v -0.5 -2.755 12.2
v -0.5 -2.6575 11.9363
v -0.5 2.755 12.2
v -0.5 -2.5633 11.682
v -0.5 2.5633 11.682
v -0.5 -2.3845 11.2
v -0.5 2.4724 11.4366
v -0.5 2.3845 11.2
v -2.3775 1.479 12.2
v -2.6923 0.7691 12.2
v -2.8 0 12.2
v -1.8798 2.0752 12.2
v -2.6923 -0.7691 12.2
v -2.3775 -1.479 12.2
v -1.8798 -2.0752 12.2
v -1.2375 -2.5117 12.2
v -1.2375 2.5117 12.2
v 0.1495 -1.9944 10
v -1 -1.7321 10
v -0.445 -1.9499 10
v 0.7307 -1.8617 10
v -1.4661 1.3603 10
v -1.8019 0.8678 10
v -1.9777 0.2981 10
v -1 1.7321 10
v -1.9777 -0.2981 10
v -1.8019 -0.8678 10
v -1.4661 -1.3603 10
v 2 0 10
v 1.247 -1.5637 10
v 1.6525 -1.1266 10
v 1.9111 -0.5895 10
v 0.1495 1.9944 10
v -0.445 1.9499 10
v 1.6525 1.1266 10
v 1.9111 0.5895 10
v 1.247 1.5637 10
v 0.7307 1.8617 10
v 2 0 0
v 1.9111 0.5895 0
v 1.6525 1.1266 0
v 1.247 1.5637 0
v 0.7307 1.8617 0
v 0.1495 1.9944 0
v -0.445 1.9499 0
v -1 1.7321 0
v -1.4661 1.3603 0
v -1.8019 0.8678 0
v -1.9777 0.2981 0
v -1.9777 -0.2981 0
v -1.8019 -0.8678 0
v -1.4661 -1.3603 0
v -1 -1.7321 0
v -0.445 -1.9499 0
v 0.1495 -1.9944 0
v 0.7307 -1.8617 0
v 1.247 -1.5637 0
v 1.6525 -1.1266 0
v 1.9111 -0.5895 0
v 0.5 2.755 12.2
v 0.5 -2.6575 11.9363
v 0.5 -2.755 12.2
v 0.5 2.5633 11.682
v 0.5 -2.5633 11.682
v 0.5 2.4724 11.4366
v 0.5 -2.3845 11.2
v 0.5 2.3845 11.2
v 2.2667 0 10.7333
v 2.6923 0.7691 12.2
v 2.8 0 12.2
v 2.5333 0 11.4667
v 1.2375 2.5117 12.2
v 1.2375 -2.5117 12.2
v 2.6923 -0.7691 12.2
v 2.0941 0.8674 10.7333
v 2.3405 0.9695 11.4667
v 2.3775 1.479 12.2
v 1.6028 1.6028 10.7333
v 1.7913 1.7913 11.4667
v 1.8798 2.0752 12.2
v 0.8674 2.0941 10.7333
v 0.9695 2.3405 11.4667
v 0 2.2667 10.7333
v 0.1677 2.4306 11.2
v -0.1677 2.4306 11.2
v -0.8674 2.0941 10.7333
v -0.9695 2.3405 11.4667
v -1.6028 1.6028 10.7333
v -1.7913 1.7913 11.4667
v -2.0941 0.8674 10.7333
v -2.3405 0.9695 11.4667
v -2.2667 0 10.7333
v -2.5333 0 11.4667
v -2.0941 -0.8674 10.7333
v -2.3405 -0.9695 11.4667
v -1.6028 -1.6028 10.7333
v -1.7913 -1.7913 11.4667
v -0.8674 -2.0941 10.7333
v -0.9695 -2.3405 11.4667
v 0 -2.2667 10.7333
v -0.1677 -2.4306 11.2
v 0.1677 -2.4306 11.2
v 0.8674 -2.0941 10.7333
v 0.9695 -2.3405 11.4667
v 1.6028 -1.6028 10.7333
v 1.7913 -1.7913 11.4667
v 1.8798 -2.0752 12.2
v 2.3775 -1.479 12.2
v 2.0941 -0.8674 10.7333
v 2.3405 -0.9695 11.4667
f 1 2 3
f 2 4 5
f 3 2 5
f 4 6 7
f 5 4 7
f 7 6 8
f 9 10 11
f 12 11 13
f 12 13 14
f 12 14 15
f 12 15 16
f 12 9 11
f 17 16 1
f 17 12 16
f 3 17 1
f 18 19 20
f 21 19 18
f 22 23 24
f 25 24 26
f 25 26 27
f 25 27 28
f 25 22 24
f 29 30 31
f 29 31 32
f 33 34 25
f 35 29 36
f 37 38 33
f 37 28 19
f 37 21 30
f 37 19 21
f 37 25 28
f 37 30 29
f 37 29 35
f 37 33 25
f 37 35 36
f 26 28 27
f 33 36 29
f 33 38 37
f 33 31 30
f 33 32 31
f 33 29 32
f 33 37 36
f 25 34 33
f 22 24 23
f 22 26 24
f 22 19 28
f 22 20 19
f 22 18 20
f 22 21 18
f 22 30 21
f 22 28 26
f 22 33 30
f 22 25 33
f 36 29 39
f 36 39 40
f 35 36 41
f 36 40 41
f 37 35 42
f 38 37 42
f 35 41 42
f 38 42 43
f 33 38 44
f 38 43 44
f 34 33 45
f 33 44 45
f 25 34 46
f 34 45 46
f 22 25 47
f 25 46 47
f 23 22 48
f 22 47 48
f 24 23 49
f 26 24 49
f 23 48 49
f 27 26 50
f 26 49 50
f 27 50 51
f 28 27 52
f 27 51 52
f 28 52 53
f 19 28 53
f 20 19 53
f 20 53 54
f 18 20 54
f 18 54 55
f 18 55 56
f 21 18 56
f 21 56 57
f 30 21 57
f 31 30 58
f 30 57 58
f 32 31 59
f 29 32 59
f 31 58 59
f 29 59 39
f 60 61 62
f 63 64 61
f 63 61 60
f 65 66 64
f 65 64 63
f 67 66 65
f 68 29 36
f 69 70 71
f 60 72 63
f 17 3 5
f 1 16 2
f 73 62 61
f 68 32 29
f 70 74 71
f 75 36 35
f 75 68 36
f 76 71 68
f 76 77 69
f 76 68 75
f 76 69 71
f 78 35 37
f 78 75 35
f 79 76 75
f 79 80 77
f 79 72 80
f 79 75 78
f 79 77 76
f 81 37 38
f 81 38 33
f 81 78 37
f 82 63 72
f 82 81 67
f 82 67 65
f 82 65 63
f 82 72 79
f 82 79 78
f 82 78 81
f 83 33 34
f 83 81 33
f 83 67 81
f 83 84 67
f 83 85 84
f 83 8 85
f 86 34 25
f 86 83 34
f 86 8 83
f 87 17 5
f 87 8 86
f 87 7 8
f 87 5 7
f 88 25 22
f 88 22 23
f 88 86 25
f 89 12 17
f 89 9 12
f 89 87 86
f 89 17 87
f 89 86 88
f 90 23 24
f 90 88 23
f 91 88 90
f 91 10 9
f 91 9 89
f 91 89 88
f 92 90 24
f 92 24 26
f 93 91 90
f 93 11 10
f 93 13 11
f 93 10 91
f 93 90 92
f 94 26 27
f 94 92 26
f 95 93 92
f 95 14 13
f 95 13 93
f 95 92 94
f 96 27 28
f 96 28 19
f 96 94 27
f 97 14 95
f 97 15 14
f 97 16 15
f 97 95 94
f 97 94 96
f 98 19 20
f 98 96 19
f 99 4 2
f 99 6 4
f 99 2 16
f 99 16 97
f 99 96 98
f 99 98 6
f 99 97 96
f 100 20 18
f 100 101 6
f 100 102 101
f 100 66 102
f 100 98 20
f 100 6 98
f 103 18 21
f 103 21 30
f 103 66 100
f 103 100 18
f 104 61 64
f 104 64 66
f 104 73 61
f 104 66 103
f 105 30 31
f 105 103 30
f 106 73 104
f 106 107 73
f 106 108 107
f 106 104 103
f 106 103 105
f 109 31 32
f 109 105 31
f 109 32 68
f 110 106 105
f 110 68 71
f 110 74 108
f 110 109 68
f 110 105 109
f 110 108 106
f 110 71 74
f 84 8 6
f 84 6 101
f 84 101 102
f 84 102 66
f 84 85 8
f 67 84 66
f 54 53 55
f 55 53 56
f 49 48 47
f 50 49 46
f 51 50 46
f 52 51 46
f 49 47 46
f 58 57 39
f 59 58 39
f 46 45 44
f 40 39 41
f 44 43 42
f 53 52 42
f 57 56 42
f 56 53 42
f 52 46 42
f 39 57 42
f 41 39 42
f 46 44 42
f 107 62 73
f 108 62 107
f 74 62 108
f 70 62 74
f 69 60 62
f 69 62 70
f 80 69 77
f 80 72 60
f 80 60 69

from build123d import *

# Parameters (mm, degrees)
CYLINDER_R     = 2
CYLINDER_DEPTH = 10
BOX_W          = 1
BOX_H          = 5.6
BOX_DEPTH      = 1


with BuildPart() as cilindre:
    # Cylinder → Cylinder (new body)
    with BuildSketch(Plane.XY):
        Circle(CYLINDER_R)
    extrude(amount=CYLINDER_DEPTH)


with BuildPart() as cub:
    # Box → Box (new body)
    with BuildSketch(Plane(origin=(-0.5, -2.8, 11.2), x_dir=(1, 0, 0), z_dir=(0, 0, 1))):
        with Locations((0.5, 2.8)):
            Rectangle(BOX_W, BOX_H)
    extrude(amount=BOX_DEPTH)


with BuildPart() as cut:
    # Cone → Cone (revolve)
    with BuildSketch(Plane(origin=(0, 0, 10), x_dir=(1, 0, 0), z_dir=(0, -1, 0))):
        Polygon((0, 0), (2, 0), (2.8, 2.2), (0, 2.2), align=None)
    revolve(axis=Axis((0, 0, 10), (0, 0, 1)))

    # Cut: cut Cub
    add(cub.part, mode=Mode.SUBTRACT)


solid = Compound([cilindre.part, cut.part])
